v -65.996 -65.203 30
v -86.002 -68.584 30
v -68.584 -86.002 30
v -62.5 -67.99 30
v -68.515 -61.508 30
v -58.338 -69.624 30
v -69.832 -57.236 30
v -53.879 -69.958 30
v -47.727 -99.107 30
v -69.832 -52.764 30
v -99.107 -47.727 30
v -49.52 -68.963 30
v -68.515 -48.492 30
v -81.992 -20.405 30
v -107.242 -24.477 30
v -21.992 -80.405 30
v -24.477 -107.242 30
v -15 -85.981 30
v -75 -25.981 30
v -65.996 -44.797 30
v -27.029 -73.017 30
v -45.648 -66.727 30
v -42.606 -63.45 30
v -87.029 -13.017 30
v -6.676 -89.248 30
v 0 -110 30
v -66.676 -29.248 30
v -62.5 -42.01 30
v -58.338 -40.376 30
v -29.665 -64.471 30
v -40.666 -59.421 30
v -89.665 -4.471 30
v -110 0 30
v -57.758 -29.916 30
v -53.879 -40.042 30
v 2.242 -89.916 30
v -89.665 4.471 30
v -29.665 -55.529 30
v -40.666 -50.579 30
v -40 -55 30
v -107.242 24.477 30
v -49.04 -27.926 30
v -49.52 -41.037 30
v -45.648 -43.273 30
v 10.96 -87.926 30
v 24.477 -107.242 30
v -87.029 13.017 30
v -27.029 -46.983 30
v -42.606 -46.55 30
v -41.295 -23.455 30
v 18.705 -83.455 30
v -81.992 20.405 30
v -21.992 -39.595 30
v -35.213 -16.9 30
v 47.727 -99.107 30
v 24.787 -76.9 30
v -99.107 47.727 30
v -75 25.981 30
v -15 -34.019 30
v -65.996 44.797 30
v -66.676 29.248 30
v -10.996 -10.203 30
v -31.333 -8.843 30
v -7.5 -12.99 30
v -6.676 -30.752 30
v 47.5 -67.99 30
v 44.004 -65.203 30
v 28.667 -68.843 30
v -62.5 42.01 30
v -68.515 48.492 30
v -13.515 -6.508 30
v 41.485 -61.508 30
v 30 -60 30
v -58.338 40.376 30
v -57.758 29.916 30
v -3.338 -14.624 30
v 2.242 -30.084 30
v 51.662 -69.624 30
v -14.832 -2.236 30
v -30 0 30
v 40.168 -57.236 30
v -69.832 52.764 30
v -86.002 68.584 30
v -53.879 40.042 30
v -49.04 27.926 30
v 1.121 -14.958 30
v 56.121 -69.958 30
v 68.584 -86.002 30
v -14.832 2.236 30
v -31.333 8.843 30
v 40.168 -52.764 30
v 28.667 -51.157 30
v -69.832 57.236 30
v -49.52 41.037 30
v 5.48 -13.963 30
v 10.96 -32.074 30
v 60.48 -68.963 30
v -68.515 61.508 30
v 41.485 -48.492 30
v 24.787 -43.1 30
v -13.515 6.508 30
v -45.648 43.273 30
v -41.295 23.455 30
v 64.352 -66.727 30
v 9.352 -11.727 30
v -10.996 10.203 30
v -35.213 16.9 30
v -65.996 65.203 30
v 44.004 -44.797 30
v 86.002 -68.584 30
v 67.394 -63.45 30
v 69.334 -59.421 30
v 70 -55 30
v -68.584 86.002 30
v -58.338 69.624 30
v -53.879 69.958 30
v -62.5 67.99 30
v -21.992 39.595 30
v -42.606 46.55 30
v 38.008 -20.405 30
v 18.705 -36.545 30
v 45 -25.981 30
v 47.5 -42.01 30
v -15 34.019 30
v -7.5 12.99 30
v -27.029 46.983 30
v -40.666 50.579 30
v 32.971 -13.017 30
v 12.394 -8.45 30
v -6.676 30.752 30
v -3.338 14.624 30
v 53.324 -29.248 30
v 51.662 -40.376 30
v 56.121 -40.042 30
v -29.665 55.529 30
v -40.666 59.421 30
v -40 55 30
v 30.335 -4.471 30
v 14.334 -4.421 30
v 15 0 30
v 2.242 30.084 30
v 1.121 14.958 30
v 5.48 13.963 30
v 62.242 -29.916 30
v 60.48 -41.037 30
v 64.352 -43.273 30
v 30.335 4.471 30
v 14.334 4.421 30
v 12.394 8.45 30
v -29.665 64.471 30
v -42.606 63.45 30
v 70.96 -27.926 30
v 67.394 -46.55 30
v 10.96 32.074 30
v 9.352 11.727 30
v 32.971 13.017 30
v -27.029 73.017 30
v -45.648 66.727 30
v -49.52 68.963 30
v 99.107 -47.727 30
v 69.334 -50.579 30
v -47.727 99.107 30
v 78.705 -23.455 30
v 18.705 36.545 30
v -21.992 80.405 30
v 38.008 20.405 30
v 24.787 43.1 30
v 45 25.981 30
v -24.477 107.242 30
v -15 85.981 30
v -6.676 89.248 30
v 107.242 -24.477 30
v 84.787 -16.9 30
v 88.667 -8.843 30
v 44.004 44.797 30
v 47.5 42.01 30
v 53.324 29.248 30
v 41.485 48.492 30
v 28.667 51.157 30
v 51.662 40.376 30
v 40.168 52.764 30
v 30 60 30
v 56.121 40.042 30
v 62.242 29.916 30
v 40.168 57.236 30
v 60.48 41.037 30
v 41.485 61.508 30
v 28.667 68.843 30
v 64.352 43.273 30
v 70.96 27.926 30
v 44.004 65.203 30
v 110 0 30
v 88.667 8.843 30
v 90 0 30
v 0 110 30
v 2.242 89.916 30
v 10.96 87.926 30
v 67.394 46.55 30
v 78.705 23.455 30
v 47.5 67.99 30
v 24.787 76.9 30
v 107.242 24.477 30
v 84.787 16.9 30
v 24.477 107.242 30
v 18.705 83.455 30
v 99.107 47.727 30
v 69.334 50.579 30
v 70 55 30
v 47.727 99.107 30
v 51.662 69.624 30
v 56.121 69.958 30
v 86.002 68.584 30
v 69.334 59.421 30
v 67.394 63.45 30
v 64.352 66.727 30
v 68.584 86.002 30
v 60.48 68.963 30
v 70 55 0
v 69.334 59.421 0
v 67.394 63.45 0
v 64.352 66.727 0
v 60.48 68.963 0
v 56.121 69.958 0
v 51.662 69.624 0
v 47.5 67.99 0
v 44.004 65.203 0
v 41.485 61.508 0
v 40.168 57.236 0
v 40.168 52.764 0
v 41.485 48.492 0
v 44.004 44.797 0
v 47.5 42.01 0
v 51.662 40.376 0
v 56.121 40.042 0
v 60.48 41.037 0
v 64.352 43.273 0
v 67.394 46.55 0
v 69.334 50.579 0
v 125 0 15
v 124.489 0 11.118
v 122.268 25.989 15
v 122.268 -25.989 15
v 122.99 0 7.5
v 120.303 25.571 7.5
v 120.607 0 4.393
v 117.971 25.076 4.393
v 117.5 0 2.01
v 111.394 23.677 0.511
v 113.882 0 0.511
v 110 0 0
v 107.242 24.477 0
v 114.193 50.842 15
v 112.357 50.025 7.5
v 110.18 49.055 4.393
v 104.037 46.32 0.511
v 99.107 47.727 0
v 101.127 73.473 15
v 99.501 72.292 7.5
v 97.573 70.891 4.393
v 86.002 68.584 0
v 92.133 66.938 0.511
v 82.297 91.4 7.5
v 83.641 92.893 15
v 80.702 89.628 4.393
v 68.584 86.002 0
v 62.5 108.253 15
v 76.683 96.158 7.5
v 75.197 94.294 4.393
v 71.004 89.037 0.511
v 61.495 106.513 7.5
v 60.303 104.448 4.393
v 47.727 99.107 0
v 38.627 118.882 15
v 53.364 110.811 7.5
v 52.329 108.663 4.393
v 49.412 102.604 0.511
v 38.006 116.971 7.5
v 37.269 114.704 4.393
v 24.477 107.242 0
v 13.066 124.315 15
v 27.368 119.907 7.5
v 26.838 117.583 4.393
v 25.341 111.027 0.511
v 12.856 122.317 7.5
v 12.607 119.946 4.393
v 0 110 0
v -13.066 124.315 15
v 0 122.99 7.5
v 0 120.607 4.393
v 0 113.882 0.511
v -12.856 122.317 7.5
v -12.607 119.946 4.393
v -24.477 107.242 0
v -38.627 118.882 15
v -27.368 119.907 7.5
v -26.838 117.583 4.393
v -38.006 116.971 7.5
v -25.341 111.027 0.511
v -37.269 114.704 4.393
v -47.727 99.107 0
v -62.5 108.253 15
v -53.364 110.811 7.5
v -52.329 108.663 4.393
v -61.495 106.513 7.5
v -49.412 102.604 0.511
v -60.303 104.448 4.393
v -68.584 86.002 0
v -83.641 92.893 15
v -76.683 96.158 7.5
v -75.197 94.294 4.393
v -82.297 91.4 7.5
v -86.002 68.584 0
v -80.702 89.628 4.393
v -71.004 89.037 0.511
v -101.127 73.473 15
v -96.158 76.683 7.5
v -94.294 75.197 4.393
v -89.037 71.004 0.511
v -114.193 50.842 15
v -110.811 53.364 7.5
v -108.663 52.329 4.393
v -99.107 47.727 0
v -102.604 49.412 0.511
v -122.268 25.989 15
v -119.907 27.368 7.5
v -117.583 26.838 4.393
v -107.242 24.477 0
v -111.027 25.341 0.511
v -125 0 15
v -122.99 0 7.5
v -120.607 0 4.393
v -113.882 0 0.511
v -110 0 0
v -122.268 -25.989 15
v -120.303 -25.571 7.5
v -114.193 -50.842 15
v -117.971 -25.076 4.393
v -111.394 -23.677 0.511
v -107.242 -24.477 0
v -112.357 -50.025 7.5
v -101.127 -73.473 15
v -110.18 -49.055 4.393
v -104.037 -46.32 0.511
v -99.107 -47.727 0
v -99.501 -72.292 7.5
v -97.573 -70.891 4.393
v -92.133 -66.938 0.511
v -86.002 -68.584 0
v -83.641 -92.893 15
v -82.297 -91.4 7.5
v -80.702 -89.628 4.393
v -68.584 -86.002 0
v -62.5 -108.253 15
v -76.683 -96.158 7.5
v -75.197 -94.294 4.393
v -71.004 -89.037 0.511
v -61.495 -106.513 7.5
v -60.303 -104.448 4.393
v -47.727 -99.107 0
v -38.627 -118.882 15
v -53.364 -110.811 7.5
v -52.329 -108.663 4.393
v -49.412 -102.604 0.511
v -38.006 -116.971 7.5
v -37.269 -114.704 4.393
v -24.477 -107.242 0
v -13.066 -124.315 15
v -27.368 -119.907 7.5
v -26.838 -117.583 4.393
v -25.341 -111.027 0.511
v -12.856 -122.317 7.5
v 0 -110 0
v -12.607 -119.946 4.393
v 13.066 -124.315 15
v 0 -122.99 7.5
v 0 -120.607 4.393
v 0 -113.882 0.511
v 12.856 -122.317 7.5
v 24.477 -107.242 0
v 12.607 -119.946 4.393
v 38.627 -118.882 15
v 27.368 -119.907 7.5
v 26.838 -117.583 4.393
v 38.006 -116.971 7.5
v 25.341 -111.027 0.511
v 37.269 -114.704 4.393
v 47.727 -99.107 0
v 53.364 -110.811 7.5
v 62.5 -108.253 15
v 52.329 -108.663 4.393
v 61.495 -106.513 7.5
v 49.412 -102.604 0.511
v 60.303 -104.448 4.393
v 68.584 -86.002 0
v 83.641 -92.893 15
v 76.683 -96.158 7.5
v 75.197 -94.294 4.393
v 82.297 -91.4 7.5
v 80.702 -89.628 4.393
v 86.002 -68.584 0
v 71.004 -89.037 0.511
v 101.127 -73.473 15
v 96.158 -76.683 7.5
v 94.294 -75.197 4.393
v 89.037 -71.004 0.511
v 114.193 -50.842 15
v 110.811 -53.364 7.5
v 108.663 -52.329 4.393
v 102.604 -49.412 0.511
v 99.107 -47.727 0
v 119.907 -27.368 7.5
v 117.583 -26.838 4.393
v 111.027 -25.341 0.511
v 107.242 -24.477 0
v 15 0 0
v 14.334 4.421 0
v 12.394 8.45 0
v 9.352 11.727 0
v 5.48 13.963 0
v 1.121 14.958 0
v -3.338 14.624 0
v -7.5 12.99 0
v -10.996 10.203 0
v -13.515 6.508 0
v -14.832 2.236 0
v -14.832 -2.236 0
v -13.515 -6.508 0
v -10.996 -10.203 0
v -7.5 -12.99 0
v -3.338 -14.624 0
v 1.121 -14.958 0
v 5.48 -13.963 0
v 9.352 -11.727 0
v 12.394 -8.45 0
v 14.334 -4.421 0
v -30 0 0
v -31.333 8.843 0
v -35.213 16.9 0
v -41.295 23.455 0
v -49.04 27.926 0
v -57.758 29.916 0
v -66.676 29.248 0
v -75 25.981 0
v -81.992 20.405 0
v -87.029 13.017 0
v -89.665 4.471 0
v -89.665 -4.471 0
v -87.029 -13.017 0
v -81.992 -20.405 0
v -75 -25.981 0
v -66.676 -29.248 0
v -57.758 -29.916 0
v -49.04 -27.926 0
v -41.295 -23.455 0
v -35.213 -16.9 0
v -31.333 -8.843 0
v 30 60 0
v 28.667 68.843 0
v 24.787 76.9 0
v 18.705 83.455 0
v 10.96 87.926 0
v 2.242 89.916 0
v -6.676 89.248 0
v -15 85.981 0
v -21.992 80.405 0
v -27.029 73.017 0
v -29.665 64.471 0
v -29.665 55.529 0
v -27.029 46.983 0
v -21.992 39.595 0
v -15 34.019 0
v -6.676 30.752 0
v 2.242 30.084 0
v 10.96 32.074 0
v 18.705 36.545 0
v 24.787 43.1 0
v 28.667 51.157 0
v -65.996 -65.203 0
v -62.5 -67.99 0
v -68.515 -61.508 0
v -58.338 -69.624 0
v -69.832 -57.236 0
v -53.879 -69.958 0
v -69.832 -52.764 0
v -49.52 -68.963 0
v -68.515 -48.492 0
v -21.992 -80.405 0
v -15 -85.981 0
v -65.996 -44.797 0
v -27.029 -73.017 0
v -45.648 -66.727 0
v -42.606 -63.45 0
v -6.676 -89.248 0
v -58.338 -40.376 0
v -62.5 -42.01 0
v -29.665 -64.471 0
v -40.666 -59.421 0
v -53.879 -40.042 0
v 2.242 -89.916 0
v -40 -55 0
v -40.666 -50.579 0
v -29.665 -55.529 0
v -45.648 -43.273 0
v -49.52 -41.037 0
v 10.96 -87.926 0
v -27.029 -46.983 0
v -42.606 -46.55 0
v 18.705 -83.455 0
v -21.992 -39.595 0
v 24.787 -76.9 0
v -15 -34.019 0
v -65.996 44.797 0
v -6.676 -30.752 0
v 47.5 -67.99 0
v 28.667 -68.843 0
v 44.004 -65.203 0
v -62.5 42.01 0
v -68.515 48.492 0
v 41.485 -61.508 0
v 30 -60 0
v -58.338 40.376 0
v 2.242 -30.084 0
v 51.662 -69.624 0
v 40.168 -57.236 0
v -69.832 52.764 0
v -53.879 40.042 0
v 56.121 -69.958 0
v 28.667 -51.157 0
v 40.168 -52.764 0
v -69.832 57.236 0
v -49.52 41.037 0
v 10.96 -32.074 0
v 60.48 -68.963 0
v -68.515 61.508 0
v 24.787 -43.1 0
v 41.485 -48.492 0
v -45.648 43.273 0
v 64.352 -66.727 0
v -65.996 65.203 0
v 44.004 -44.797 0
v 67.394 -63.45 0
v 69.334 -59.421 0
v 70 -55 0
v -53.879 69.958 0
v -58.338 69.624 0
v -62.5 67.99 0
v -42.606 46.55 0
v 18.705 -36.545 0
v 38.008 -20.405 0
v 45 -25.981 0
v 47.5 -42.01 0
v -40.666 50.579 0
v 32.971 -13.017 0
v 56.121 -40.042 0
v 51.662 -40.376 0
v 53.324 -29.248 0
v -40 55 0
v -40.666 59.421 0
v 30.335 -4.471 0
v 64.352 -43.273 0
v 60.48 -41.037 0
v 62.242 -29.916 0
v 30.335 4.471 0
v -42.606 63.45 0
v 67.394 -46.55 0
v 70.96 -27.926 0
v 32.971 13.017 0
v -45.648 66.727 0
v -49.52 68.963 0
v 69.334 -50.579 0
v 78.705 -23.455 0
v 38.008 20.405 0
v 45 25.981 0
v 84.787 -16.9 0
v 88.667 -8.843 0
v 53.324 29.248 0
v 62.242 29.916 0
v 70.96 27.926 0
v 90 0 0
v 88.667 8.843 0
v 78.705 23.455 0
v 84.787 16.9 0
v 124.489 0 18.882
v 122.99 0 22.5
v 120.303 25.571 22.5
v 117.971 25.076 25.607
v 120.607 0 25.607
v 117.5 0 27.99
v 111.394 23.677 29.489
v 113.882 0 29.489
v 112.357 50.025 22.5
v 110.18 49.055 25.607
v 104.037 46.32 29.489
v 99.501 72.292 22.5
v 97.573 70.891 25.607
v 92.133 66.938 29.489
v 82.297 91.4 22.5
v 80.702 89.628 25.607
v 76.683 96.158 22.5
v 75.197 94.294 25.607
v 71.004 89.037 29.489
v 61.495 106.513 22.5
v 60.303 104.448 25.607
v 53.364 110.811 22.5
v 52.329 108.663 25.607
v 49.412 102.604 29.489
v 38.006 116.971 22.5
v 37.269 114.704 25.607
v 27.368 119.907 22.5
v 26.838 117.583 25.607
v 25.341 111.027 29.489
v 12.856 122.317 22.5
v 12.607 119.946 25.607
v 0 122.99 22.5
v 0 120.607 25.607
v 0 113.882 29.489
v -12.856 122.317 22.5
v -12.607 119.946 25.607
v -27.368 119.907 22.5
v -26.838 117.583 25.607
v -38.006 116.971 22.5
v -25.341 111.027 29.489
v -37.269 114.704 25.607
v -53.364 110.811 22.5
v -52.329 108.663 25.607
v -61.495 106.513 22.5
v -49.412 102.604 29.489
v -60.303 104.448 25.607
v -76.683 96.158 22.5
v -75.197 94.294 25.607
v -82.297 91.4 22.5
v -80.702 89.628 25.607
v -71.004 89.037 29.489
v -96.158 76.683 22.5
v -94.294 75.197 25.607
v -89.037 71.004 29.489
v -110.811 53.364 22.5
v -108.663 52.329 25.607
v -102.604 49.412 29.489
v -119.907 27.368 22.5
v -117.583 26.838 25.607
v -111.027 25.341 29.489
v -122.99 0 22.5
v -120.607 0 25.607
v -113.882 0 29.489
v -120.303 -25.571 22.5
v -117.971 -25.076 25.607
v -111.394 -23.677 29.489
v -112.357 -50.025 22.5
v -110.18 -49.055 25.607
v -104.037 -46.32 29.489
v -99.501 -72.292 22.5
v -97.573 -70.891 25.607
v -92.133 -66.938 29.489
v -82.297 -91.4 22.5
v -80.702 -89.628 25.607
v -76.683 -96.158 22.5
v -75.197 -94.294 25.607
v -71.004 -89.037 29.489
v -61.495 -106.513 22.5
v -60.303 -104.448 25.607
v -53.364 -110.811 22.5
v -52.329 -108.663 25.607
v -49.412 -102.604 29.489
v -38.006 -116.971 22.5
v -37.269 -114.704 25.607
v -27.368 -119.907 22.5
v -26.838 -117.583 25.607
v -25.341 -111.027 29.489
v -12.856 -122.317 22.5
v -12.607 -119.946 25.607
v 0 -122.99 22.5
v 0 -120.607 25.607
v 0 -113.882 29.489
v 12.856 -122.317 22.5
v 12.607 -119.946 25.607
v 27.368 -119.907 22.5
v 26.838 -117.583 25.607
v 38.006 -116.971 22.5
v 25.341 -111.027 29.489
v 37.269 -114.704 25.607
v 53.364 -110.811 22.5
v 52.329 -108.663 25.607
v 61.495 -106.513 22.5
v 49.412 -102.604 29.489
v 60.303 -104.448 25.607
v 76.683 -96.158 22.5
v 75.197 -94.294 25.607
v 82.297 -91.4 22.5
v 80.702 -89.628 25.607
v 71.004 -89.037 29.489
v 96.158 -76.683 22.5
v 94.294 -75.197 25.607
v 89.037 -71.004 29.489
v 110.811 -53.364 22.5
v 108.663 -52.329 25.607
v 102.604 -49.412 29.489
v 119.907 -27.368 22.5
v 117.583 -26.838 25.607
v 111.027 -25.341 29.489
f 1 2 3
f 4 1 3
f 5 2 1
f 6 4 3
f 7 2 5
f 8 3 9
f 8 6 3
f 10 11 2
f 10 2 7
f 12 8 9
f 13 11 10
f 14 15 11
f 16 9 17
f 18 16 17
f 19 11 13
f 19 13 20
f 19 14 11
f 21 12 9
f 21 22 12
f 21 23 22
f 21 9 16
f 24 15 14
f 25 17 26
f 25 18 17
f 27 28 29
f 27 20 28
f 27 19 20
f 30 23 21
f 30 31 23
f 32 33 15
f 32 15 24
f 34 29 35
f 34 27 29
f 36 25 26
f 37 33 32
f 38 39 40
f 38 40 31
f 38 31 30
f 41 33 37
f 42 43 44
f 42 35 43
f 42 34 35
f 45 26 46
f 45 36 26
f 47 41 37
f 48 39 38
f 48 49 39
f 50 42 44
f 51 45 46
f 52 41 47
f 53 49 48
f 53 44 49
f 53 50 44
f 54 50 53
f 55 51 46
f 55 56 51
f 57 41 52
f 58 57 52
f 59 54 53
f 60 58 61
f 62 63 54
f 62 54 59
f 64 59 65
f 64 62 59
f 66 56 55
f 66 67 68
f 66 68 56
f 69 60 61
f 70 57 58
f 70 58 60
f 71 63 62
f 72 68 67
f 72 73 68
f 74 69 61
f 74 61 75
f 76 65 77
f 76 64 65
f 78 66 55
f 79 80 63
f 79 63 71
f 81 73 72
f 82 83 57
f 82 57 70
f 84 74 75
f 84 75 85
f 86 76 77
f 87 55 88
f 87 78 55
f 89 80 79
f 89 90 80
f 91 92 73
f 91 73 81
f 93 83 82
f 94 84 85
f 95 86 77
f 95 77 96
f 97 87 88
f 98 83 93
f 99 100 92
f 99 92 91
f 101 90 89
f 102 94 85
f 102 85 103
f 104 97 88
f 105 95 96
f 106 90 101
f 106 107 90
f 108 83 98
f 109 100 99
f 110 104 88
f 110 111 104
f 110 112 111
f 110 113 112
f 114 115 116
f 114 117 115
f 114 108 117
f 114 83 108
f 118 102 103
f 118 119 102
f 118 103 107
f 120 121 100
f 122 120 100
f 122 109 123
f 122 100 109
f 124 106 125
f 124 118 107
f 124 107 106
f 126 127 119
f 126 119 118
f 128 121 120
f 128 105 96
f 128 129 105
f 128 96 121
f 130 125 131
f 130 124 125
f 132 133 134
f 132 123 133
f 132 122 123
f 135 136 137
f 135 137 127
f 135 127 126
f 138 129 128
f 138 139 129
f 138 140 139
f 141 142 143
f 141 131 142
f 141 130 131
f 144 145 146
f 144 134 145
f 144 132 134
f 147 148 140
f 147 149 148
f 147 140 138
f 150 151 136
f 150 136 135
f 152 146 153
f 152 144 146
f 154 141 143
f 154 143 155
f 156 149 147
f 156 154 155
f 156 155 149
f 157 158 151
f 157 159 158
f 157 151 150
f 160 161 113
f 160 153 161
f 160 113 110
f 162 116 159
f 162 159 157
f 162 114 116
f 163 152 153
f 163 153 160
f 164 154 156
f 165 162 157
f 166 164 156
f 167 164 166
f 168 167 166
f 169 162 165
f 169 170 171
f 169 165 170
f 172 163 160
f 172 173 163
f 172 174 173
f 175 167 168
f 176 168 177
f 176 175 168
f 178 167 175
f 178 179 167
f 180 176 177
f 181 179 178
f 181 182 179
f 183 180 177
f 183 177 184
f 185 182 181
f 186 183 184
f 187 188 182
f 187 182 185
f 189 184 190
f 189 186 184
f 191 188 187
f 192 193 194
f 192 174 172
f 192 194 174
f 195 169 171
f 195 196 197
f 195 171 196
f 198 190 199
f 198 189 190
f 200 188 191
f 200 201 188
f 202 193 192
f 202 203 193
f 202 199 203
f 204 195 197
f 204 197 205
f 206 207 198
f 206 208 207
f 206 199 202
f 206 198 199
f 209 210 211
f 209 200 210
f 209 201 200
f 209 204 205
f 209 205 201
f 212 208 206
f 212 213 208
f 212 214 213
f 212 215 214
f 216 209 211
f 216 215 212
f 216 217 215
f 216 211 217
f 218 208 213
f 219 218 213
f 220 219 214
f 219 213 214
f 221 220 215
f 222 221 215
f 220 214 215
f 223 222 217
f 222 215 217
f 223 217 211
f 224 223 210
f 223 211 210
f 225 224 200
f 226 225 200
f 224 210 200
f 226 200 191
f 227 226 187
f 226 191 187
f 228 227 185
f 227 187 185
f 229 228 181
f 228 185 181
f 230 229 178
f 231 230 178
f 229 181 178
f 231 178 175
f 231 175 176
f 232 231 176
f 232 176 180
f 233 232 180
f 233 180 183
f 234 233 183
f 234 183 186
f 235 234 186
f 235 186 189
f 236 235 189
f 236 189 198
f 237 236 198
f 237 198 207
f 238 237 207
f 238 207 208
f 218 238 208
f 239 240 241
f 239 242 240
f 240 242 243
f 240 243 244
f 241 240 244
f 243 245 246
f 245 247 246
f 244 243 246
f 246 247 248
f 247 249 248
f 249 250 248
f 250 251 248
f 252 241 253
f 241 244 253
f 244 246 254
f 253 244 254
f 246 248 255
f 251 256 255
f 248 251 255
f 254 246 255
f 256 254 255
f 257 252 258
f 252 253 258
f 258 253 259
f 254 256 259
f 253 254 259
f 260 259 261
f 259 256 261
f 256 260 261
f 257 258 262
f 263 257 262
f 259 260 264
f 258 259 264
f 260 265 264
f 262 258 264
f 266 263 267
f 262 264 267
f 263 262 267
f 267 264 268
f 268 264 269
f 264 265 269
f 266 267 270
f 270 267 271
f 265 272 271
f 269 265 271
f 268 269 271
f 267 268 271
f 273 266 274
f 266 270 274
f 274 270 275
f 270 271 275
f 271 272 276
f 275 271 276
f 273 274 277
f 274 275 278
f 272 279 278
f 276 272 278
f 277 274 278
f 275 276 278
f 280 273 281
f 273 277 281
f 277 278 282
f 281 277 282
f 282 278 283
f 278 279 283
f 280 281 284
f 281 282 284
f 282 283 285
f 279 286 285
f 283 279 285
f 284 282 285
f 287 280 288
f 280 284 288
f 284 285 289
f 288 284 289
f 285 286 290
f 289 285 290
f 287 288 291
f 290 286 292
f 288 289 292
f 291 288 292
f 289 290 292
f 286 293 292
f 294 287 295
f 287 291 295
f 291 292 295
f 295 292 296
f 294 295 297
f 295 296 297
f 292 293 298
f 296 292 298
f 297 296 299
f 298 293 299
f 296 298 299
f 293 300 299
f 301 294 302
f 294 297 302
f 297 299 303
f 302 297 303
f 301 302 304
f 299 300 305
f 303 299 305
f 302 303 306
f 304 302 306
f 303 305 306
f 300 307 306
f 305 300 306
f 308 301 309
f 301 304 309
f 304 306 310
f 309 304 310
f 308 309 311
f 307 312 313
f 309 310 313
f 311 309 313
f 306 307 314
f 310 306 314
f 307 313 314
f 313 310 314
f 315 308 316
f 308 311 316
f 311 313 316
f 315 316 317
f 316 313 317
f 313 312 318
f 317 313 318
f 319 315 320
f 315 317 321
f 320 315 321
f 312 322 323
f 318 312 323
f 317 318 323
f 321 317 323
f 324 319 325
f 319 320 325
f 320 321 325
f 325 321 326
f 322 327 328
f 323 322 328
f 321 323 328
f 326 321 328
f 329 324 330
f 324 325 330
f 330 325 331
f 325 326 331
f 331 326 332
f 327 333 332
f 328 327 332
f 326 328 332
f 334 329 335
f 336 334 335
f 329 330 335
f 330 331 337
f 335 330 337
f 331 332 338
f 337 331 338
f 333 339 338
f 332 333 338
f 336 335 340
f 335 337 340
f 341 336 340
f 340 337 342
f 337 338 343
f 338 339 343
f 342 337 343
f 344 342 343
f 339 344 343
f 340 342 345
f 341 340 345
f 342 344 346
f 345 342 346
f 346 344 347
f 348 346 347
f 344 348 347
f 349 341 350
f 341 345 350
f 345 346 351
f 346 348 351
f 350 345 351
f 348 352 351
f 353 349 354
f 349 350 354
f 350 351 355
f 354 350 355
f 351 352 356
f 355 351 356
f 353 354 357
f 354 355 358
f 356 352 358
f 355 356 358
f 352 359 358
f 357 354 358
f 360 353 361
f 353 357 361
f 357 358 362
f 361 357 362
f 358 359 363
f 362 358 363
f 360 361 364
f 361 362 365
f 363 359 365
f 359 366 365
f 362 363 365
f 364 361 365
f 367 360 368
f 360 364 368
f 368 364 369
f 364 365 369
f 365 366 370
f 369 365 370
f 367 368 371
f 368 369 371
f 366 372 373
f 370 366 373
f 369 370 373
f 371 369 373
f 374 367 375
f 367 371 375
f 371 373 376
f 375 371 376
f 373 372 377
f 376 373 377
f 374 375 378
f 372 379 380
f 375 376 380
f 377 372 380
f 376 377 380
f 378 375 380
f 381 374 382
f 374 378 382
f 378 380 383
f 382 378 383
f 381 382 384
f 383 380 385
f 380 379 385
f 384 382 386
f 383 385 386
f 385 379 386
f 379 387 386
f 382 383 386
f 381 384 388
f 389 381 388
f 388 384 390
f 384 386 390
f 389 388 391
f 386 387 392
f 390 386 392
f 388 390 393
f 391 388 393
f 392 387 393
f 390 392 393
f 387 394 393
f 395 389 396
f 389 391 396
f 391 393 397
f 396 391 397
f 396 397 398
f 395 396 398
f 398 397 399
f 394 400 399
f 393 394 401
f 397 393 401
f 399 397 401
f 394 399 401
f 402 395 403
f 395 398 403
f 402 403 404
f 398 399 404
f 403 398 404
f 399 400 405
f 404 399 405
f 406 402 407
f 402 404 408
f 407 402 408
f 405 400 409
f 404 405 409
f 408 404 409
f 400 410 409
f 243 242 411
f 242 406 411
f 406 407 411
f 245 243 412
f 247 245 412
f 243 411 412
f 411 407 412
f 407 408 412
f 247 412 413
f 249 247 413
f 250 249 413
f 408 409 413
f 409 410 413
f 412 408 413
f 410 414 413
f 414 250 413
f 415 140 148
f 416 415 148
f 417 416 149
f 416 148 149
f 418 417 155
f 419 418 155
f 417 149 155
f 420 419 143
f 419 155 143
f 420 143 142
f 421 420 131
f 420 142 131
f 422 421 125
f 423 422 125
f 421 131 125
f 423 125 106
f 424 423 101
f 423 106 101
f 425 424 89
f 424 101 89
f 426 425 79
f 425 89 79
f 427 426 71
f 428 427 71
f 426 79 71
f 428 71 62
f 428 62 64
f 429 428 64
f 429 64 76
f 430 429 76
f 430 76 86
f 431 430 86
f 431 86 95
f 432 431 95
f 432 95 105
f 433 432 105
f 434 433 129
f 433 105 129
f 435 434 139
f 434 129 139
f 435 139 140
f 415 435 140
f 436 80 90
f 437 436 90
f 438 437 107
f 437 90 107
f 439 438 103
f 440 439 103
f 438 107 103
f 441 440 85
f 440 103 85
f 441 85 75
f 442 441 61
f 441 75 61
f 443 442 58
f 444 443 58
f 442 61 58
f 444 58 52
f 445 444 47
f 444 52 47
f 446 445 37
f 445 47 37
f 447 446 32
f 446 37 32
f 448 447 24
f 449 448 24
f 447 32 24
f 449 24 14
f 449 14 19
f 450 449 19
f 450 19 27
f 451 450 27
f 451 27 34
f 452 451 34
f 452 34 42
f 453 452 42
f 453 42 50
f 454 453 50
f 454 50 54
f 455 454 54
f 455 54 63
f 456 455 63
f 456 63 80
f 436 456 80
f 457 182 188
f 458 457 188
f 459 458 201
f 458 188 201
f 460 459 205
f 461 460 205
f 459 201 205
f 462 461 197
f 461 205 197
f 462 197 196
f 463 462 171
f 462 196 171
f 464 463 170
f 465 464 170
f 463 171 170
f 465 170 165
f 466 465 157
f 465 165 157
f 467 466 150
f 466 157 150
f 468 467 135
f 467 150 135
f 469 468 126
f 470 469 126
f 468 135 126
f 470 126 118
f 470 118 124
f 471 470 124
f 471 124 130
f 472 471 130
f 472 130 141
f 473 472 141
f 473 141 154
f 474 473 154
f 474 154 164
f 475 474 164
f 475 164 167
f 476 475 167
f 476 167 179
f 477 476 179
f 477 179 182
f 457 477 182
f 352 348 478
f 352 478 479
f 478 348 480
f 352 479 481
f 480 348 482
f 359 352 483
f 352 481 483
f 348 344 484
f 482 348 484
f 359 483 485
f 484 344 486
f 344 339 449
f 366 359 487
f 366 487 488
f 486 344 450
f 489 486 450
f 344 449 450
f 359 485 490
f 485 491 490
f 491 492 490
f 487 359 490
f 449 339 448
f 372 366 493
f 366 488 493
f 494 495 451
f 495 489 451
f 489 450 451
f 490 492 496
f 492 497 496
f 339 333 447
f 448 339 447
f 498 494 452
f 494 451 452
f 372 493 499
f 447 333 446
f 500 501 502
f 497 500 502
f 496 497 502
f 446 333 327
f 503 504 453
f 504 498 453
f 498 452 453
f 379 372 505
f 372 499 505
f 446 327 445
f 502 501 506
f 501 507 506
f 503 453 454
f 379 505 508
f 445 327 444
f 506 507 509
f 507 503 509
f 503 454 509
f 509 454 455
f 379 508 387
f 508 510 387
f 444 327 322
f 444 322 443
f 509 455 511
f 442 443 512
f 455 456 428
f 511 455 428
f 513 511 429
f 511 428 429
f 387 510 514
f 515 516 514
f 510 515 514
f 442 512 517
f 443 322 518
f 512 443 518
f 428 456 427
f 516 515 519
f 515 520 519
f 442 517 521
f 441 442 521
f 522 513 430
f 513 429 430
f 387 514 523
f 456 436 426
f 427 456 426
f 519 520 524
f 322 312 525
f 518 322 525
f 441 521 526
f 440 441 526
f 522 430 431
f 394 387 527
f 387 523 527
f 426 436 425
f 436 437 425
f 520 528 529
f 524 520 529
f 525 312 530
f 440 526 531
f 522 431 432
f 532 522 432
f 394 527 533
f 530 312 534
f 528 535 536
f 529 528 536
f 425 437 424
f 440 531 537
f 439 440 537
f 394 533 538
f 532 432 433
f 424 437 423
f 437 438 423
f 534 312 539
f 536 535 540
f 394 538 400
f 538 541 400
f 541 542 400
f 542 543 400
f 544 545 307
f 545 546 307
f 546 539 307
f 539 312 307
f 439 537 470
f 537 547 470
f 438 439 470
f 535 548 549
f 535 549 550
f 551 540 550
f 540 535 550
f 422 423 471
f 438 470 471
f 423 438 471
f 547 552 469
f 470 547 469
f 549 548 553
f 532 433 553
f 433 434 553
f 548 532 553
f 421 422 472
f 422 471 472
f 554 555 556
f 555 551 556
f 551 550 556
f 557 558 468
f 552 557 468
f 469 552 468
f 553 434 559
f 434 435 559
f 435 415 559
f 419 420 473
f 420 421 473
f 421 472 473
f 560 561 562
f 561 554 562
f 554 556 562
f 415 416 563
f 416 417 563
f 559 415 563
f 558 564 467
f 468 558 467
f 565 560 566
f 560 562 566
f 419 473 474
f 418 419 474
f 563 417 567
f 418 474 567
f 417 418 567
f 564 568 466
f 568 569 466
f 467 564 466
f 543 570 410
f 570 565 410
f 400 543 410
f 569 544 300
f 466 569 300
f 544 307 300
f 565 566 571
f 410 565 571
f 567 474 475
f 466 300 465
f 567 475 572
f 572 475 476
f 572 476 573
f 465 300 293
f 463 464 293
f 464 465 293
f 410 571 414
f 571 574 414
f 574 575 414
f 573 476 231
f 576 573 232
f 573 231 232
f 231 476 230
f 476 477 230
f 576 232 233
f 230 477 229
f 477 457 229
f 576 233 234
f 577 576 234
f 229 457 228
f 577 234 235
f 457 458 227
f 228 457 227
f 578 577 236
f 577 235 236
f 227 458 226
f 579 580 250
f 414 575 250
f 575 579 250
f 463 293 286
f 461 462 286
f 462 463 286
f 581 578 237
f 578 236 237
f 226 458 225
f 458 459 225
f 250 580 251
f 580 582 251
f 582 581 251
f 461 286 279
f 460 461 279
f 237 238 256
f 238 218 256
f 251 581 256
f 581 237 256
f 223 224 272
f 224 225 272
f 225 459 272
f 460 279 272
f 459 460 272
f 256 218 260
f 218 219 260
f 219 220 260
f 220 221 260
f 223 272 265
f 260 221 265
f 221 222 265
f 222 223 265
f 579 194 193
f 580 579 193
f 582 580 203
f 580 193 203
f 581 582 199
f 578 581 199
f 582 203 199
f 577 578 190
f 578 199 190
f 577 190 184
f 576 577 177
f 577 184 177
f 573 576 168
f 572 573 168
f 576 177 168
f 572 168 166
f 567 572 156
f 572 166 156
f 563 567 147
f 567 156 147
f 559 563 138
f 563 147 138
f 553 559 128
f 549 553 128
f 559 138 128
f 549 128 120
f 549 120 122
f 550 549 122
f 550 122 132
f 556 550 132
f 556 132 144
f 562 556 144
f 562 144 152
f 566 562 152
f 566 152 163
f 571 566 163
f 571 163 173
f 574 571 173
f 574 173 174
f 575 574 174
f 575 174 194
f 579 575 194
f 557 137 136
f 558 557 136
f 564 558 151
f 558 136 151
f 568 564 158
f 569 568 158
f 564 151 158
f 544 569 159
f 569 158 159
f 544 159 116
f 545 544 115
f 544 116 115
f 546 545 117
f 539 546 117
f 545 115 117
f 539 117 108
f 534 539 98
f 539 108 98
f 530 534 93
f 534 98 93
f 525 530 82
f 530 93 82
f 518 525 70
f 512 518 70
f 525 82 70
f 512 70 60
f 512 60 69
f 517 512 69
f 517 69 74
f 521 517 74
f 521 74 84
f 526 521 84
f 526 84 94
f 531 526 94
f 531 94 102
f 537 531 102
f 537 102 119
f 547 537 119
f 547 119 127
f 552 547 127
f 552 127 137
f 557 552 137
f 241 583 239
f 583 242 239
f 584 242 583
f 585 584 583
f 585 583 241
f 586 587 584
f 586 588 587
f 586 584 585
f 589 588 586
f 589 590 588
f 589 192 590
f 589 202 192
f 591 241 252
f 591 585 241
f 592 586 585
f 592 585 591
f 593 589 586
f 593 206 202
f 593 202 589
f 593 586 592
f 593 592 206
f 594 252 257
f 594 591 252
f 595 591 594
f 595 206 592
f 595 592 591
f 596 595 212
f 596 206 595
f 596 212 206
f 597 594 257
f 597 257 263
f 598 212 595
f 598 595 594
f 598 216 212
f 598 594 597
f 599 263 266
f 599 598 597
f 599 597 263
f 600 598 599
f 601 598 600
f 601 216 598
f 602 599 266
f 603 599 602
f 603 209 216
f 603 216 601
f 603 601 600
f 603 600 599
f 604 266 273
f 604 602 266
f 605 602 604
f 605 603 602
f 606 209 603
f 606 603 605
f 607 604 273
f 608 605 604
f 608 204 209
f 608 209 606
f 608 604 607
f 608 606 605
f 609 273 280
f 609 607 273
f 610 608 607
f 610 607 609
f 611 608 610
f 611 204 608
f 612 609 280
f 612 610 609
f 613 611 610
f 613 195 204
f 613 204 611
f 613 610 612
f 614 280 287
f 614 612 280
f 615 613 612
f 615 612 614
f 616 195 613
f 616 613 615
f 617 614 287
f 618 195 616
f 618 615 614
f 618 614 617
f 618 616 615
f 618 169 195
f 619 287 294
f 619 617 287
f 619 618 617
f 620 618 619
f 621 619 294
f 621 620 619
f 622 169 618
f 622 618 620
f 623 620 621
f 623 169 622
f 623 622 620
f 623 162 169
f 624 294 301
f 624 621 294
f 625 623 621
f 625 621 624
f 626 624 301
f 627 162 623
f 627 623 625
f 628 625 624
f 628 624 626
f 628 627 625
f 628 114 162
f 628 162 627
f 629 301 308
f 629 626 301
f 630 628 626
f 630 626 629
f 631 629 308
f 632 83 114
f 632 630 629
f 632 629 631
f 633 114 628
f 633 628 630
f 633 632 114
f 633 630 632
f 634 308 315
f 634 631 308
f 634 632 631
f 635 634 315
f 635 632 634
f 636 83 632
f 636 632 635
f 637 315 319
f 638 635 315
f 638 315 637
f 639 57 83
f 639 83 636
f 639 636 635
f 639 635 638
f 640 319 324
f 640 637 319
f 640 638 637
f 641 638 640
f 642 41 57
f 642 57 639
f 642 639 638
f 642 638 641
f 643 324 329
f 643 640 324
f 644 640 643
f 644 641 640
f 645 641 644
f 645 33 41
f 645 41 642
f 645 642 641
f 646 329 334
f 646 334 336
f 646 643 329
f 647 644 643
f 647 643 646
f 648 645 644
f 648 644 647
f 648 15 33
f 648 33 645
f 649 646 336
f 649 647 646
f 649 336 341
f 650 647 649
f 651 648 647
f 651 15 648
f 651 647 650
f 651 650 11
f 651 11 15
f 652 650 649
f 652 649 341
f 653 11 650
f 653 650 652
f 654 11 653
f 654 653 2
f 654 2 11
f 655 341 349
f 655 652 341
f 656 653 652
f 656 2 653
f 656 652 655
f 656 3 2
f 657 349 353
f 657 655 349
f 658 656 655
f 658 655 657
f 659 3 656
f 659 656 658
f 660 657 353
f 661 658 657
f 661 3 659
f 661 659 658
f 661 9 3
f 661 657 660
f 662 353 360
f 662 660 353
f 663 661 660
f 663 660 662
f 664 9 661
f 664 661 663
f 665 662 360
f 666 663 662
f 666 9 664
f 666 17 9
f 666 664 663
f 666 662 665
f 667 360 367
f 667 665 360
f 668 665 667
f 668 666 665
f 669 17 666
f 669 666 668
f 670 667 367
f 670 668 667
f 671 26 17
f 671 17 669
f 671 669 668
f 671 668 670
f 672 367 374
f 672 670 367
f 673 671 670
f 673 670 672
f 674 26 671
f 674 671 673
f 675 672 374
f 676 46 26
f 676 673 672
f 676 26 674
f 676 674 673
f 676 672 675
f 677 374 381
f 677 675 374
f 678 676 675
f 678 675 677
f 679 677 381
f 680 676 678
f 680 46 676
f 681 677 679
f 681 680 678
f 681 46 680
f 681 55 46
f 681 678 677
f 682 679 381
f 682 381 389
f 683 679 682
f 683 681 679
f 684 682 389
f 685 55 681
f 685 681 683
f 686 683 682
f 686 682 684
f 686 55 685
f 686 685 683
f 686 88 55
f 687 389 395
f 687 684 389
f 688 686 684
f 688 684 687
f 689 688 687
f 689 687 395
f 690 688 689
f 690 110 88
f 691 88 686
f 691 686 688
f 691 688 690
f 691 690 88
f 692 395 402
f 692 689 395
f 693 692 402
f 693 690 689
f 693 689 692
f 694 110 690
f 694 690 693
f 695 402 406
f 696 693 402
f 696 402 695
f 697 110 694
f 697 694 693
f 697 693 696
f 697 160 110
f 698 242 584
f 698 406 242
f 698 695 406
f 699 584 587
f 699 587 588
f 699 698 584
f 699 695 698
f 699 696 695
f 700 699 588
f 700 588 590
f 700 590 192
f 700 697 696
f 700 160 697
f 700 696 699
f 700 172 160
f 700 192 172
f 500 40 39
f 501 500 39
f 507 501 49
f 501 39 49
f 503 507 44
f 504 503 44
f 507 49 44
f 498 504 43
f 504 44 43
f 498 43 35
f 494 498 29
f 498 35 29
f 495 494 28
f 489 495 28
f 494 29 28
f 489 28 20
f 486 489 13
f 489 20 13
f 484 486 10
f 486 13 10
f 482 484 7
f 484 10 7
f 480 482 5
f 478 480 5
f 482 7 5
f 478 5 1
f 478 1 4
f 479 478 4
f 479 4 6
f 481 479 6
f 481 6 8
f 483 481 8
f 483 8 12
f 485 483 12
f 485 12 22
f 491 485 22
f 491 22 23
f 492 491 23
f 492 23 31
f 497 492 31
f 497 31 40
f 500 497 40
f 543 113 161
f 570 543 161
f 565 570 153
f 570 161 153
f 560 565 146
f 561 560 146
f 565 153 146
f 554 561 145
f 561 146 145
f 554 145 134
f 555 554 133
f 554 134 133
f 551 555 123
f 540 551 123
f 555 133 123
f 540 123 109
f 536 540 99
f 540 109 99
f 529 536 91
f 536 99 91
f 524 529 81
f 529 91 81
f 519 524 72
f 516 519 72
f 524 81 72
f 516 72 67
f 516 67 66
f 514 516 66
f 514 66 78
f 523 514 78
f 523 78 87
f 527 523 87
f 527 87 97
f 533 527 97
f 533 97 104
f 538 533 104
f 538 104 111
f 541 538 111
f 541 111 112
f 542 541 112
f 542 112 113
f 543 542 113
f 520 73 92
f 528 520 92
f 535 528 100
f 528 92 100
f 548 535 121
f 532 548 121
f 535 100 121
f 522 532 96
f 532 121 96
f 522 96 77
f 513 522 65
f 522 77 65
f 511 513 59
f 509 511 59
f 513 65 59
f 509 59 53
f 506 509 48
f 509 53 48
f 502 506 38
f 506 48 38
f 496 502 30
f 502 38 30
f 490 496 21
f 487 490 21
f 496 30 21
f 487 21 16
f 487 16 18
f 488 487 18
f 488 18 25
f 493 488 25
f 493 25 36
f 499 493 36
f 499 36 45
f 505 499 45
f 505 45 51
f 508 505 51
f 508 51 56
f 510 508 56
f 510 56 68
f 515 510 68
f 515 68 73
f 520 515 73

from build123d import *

# Parameters (mm, degrees)
SKETCH1_R           = 125
BOSS_EXTRUDE1_DEPTH = 30
FILLET1_R           = 15
SKETCH2_R           = 15
CUT_EXTRUDE1_DEPTH  = 30
SKETCH3_R           = 30
SKETCH3_R_2         = 15
CUT_EXTRUDE2_DEPTH  = 50


with BuildPart() as part:
    # Sketch1 → Boss-Extrude1 (new body)
    with BuildSketch(Plane.XY):
        Circle(SKETCH1_R)
    extrude(amount=BOSS_EXTRUDE1_DEPTH)

    # Fillet1
    fillet1_edges = [part.edges().sort_by_distance(p)[0] for p in [
        (-125, 0, 0),
        (-125, 0, 30),
    ]]
    fillet(fillet1_edges, radius=FILLET1_R - 0.0001)  # a hair under: the kernel refuses the full size

    # Sketch2 → Cut-Extrude1 (cut)
    with BuildSketch(Plane.XY.offset(30)):
        Circle(SKETCH2_R)
    extrude(amount=-CUT_EXTRUDE1_DEPTH, mode=Mode.SUBTRACT)

    # Sketch3 → Cut-Extrude2 (cut)
    with BuildSketch(Plane.XY.offset(30)):
        with Locations((0, 60)):
            Circle(SKETCH3_R)
        with Locations((-60, 0)):
            Circle(SKETCH3_R)
        with Locations((0, -60)):
            Circle(SKETCH3_R)
        with Locations((60, 0)):
            Circle(SKETCH3_R)
        with Locations((55, -55)):
            Circle(SKETCH3_R_2)
        with Locations((-55, -55)):
            Circle(SKETCH3_R_2)
        with Locations((-55, 55)):
            Circle(SKETCH3_R_2)
        with Locations((55, 55)):
            Circle(SKETCH3_R_2)
    extrude(amount=-CUT_EXTRUDE2_DEPTH, mode=Mode.SUBTRACT)


solid = part.part
